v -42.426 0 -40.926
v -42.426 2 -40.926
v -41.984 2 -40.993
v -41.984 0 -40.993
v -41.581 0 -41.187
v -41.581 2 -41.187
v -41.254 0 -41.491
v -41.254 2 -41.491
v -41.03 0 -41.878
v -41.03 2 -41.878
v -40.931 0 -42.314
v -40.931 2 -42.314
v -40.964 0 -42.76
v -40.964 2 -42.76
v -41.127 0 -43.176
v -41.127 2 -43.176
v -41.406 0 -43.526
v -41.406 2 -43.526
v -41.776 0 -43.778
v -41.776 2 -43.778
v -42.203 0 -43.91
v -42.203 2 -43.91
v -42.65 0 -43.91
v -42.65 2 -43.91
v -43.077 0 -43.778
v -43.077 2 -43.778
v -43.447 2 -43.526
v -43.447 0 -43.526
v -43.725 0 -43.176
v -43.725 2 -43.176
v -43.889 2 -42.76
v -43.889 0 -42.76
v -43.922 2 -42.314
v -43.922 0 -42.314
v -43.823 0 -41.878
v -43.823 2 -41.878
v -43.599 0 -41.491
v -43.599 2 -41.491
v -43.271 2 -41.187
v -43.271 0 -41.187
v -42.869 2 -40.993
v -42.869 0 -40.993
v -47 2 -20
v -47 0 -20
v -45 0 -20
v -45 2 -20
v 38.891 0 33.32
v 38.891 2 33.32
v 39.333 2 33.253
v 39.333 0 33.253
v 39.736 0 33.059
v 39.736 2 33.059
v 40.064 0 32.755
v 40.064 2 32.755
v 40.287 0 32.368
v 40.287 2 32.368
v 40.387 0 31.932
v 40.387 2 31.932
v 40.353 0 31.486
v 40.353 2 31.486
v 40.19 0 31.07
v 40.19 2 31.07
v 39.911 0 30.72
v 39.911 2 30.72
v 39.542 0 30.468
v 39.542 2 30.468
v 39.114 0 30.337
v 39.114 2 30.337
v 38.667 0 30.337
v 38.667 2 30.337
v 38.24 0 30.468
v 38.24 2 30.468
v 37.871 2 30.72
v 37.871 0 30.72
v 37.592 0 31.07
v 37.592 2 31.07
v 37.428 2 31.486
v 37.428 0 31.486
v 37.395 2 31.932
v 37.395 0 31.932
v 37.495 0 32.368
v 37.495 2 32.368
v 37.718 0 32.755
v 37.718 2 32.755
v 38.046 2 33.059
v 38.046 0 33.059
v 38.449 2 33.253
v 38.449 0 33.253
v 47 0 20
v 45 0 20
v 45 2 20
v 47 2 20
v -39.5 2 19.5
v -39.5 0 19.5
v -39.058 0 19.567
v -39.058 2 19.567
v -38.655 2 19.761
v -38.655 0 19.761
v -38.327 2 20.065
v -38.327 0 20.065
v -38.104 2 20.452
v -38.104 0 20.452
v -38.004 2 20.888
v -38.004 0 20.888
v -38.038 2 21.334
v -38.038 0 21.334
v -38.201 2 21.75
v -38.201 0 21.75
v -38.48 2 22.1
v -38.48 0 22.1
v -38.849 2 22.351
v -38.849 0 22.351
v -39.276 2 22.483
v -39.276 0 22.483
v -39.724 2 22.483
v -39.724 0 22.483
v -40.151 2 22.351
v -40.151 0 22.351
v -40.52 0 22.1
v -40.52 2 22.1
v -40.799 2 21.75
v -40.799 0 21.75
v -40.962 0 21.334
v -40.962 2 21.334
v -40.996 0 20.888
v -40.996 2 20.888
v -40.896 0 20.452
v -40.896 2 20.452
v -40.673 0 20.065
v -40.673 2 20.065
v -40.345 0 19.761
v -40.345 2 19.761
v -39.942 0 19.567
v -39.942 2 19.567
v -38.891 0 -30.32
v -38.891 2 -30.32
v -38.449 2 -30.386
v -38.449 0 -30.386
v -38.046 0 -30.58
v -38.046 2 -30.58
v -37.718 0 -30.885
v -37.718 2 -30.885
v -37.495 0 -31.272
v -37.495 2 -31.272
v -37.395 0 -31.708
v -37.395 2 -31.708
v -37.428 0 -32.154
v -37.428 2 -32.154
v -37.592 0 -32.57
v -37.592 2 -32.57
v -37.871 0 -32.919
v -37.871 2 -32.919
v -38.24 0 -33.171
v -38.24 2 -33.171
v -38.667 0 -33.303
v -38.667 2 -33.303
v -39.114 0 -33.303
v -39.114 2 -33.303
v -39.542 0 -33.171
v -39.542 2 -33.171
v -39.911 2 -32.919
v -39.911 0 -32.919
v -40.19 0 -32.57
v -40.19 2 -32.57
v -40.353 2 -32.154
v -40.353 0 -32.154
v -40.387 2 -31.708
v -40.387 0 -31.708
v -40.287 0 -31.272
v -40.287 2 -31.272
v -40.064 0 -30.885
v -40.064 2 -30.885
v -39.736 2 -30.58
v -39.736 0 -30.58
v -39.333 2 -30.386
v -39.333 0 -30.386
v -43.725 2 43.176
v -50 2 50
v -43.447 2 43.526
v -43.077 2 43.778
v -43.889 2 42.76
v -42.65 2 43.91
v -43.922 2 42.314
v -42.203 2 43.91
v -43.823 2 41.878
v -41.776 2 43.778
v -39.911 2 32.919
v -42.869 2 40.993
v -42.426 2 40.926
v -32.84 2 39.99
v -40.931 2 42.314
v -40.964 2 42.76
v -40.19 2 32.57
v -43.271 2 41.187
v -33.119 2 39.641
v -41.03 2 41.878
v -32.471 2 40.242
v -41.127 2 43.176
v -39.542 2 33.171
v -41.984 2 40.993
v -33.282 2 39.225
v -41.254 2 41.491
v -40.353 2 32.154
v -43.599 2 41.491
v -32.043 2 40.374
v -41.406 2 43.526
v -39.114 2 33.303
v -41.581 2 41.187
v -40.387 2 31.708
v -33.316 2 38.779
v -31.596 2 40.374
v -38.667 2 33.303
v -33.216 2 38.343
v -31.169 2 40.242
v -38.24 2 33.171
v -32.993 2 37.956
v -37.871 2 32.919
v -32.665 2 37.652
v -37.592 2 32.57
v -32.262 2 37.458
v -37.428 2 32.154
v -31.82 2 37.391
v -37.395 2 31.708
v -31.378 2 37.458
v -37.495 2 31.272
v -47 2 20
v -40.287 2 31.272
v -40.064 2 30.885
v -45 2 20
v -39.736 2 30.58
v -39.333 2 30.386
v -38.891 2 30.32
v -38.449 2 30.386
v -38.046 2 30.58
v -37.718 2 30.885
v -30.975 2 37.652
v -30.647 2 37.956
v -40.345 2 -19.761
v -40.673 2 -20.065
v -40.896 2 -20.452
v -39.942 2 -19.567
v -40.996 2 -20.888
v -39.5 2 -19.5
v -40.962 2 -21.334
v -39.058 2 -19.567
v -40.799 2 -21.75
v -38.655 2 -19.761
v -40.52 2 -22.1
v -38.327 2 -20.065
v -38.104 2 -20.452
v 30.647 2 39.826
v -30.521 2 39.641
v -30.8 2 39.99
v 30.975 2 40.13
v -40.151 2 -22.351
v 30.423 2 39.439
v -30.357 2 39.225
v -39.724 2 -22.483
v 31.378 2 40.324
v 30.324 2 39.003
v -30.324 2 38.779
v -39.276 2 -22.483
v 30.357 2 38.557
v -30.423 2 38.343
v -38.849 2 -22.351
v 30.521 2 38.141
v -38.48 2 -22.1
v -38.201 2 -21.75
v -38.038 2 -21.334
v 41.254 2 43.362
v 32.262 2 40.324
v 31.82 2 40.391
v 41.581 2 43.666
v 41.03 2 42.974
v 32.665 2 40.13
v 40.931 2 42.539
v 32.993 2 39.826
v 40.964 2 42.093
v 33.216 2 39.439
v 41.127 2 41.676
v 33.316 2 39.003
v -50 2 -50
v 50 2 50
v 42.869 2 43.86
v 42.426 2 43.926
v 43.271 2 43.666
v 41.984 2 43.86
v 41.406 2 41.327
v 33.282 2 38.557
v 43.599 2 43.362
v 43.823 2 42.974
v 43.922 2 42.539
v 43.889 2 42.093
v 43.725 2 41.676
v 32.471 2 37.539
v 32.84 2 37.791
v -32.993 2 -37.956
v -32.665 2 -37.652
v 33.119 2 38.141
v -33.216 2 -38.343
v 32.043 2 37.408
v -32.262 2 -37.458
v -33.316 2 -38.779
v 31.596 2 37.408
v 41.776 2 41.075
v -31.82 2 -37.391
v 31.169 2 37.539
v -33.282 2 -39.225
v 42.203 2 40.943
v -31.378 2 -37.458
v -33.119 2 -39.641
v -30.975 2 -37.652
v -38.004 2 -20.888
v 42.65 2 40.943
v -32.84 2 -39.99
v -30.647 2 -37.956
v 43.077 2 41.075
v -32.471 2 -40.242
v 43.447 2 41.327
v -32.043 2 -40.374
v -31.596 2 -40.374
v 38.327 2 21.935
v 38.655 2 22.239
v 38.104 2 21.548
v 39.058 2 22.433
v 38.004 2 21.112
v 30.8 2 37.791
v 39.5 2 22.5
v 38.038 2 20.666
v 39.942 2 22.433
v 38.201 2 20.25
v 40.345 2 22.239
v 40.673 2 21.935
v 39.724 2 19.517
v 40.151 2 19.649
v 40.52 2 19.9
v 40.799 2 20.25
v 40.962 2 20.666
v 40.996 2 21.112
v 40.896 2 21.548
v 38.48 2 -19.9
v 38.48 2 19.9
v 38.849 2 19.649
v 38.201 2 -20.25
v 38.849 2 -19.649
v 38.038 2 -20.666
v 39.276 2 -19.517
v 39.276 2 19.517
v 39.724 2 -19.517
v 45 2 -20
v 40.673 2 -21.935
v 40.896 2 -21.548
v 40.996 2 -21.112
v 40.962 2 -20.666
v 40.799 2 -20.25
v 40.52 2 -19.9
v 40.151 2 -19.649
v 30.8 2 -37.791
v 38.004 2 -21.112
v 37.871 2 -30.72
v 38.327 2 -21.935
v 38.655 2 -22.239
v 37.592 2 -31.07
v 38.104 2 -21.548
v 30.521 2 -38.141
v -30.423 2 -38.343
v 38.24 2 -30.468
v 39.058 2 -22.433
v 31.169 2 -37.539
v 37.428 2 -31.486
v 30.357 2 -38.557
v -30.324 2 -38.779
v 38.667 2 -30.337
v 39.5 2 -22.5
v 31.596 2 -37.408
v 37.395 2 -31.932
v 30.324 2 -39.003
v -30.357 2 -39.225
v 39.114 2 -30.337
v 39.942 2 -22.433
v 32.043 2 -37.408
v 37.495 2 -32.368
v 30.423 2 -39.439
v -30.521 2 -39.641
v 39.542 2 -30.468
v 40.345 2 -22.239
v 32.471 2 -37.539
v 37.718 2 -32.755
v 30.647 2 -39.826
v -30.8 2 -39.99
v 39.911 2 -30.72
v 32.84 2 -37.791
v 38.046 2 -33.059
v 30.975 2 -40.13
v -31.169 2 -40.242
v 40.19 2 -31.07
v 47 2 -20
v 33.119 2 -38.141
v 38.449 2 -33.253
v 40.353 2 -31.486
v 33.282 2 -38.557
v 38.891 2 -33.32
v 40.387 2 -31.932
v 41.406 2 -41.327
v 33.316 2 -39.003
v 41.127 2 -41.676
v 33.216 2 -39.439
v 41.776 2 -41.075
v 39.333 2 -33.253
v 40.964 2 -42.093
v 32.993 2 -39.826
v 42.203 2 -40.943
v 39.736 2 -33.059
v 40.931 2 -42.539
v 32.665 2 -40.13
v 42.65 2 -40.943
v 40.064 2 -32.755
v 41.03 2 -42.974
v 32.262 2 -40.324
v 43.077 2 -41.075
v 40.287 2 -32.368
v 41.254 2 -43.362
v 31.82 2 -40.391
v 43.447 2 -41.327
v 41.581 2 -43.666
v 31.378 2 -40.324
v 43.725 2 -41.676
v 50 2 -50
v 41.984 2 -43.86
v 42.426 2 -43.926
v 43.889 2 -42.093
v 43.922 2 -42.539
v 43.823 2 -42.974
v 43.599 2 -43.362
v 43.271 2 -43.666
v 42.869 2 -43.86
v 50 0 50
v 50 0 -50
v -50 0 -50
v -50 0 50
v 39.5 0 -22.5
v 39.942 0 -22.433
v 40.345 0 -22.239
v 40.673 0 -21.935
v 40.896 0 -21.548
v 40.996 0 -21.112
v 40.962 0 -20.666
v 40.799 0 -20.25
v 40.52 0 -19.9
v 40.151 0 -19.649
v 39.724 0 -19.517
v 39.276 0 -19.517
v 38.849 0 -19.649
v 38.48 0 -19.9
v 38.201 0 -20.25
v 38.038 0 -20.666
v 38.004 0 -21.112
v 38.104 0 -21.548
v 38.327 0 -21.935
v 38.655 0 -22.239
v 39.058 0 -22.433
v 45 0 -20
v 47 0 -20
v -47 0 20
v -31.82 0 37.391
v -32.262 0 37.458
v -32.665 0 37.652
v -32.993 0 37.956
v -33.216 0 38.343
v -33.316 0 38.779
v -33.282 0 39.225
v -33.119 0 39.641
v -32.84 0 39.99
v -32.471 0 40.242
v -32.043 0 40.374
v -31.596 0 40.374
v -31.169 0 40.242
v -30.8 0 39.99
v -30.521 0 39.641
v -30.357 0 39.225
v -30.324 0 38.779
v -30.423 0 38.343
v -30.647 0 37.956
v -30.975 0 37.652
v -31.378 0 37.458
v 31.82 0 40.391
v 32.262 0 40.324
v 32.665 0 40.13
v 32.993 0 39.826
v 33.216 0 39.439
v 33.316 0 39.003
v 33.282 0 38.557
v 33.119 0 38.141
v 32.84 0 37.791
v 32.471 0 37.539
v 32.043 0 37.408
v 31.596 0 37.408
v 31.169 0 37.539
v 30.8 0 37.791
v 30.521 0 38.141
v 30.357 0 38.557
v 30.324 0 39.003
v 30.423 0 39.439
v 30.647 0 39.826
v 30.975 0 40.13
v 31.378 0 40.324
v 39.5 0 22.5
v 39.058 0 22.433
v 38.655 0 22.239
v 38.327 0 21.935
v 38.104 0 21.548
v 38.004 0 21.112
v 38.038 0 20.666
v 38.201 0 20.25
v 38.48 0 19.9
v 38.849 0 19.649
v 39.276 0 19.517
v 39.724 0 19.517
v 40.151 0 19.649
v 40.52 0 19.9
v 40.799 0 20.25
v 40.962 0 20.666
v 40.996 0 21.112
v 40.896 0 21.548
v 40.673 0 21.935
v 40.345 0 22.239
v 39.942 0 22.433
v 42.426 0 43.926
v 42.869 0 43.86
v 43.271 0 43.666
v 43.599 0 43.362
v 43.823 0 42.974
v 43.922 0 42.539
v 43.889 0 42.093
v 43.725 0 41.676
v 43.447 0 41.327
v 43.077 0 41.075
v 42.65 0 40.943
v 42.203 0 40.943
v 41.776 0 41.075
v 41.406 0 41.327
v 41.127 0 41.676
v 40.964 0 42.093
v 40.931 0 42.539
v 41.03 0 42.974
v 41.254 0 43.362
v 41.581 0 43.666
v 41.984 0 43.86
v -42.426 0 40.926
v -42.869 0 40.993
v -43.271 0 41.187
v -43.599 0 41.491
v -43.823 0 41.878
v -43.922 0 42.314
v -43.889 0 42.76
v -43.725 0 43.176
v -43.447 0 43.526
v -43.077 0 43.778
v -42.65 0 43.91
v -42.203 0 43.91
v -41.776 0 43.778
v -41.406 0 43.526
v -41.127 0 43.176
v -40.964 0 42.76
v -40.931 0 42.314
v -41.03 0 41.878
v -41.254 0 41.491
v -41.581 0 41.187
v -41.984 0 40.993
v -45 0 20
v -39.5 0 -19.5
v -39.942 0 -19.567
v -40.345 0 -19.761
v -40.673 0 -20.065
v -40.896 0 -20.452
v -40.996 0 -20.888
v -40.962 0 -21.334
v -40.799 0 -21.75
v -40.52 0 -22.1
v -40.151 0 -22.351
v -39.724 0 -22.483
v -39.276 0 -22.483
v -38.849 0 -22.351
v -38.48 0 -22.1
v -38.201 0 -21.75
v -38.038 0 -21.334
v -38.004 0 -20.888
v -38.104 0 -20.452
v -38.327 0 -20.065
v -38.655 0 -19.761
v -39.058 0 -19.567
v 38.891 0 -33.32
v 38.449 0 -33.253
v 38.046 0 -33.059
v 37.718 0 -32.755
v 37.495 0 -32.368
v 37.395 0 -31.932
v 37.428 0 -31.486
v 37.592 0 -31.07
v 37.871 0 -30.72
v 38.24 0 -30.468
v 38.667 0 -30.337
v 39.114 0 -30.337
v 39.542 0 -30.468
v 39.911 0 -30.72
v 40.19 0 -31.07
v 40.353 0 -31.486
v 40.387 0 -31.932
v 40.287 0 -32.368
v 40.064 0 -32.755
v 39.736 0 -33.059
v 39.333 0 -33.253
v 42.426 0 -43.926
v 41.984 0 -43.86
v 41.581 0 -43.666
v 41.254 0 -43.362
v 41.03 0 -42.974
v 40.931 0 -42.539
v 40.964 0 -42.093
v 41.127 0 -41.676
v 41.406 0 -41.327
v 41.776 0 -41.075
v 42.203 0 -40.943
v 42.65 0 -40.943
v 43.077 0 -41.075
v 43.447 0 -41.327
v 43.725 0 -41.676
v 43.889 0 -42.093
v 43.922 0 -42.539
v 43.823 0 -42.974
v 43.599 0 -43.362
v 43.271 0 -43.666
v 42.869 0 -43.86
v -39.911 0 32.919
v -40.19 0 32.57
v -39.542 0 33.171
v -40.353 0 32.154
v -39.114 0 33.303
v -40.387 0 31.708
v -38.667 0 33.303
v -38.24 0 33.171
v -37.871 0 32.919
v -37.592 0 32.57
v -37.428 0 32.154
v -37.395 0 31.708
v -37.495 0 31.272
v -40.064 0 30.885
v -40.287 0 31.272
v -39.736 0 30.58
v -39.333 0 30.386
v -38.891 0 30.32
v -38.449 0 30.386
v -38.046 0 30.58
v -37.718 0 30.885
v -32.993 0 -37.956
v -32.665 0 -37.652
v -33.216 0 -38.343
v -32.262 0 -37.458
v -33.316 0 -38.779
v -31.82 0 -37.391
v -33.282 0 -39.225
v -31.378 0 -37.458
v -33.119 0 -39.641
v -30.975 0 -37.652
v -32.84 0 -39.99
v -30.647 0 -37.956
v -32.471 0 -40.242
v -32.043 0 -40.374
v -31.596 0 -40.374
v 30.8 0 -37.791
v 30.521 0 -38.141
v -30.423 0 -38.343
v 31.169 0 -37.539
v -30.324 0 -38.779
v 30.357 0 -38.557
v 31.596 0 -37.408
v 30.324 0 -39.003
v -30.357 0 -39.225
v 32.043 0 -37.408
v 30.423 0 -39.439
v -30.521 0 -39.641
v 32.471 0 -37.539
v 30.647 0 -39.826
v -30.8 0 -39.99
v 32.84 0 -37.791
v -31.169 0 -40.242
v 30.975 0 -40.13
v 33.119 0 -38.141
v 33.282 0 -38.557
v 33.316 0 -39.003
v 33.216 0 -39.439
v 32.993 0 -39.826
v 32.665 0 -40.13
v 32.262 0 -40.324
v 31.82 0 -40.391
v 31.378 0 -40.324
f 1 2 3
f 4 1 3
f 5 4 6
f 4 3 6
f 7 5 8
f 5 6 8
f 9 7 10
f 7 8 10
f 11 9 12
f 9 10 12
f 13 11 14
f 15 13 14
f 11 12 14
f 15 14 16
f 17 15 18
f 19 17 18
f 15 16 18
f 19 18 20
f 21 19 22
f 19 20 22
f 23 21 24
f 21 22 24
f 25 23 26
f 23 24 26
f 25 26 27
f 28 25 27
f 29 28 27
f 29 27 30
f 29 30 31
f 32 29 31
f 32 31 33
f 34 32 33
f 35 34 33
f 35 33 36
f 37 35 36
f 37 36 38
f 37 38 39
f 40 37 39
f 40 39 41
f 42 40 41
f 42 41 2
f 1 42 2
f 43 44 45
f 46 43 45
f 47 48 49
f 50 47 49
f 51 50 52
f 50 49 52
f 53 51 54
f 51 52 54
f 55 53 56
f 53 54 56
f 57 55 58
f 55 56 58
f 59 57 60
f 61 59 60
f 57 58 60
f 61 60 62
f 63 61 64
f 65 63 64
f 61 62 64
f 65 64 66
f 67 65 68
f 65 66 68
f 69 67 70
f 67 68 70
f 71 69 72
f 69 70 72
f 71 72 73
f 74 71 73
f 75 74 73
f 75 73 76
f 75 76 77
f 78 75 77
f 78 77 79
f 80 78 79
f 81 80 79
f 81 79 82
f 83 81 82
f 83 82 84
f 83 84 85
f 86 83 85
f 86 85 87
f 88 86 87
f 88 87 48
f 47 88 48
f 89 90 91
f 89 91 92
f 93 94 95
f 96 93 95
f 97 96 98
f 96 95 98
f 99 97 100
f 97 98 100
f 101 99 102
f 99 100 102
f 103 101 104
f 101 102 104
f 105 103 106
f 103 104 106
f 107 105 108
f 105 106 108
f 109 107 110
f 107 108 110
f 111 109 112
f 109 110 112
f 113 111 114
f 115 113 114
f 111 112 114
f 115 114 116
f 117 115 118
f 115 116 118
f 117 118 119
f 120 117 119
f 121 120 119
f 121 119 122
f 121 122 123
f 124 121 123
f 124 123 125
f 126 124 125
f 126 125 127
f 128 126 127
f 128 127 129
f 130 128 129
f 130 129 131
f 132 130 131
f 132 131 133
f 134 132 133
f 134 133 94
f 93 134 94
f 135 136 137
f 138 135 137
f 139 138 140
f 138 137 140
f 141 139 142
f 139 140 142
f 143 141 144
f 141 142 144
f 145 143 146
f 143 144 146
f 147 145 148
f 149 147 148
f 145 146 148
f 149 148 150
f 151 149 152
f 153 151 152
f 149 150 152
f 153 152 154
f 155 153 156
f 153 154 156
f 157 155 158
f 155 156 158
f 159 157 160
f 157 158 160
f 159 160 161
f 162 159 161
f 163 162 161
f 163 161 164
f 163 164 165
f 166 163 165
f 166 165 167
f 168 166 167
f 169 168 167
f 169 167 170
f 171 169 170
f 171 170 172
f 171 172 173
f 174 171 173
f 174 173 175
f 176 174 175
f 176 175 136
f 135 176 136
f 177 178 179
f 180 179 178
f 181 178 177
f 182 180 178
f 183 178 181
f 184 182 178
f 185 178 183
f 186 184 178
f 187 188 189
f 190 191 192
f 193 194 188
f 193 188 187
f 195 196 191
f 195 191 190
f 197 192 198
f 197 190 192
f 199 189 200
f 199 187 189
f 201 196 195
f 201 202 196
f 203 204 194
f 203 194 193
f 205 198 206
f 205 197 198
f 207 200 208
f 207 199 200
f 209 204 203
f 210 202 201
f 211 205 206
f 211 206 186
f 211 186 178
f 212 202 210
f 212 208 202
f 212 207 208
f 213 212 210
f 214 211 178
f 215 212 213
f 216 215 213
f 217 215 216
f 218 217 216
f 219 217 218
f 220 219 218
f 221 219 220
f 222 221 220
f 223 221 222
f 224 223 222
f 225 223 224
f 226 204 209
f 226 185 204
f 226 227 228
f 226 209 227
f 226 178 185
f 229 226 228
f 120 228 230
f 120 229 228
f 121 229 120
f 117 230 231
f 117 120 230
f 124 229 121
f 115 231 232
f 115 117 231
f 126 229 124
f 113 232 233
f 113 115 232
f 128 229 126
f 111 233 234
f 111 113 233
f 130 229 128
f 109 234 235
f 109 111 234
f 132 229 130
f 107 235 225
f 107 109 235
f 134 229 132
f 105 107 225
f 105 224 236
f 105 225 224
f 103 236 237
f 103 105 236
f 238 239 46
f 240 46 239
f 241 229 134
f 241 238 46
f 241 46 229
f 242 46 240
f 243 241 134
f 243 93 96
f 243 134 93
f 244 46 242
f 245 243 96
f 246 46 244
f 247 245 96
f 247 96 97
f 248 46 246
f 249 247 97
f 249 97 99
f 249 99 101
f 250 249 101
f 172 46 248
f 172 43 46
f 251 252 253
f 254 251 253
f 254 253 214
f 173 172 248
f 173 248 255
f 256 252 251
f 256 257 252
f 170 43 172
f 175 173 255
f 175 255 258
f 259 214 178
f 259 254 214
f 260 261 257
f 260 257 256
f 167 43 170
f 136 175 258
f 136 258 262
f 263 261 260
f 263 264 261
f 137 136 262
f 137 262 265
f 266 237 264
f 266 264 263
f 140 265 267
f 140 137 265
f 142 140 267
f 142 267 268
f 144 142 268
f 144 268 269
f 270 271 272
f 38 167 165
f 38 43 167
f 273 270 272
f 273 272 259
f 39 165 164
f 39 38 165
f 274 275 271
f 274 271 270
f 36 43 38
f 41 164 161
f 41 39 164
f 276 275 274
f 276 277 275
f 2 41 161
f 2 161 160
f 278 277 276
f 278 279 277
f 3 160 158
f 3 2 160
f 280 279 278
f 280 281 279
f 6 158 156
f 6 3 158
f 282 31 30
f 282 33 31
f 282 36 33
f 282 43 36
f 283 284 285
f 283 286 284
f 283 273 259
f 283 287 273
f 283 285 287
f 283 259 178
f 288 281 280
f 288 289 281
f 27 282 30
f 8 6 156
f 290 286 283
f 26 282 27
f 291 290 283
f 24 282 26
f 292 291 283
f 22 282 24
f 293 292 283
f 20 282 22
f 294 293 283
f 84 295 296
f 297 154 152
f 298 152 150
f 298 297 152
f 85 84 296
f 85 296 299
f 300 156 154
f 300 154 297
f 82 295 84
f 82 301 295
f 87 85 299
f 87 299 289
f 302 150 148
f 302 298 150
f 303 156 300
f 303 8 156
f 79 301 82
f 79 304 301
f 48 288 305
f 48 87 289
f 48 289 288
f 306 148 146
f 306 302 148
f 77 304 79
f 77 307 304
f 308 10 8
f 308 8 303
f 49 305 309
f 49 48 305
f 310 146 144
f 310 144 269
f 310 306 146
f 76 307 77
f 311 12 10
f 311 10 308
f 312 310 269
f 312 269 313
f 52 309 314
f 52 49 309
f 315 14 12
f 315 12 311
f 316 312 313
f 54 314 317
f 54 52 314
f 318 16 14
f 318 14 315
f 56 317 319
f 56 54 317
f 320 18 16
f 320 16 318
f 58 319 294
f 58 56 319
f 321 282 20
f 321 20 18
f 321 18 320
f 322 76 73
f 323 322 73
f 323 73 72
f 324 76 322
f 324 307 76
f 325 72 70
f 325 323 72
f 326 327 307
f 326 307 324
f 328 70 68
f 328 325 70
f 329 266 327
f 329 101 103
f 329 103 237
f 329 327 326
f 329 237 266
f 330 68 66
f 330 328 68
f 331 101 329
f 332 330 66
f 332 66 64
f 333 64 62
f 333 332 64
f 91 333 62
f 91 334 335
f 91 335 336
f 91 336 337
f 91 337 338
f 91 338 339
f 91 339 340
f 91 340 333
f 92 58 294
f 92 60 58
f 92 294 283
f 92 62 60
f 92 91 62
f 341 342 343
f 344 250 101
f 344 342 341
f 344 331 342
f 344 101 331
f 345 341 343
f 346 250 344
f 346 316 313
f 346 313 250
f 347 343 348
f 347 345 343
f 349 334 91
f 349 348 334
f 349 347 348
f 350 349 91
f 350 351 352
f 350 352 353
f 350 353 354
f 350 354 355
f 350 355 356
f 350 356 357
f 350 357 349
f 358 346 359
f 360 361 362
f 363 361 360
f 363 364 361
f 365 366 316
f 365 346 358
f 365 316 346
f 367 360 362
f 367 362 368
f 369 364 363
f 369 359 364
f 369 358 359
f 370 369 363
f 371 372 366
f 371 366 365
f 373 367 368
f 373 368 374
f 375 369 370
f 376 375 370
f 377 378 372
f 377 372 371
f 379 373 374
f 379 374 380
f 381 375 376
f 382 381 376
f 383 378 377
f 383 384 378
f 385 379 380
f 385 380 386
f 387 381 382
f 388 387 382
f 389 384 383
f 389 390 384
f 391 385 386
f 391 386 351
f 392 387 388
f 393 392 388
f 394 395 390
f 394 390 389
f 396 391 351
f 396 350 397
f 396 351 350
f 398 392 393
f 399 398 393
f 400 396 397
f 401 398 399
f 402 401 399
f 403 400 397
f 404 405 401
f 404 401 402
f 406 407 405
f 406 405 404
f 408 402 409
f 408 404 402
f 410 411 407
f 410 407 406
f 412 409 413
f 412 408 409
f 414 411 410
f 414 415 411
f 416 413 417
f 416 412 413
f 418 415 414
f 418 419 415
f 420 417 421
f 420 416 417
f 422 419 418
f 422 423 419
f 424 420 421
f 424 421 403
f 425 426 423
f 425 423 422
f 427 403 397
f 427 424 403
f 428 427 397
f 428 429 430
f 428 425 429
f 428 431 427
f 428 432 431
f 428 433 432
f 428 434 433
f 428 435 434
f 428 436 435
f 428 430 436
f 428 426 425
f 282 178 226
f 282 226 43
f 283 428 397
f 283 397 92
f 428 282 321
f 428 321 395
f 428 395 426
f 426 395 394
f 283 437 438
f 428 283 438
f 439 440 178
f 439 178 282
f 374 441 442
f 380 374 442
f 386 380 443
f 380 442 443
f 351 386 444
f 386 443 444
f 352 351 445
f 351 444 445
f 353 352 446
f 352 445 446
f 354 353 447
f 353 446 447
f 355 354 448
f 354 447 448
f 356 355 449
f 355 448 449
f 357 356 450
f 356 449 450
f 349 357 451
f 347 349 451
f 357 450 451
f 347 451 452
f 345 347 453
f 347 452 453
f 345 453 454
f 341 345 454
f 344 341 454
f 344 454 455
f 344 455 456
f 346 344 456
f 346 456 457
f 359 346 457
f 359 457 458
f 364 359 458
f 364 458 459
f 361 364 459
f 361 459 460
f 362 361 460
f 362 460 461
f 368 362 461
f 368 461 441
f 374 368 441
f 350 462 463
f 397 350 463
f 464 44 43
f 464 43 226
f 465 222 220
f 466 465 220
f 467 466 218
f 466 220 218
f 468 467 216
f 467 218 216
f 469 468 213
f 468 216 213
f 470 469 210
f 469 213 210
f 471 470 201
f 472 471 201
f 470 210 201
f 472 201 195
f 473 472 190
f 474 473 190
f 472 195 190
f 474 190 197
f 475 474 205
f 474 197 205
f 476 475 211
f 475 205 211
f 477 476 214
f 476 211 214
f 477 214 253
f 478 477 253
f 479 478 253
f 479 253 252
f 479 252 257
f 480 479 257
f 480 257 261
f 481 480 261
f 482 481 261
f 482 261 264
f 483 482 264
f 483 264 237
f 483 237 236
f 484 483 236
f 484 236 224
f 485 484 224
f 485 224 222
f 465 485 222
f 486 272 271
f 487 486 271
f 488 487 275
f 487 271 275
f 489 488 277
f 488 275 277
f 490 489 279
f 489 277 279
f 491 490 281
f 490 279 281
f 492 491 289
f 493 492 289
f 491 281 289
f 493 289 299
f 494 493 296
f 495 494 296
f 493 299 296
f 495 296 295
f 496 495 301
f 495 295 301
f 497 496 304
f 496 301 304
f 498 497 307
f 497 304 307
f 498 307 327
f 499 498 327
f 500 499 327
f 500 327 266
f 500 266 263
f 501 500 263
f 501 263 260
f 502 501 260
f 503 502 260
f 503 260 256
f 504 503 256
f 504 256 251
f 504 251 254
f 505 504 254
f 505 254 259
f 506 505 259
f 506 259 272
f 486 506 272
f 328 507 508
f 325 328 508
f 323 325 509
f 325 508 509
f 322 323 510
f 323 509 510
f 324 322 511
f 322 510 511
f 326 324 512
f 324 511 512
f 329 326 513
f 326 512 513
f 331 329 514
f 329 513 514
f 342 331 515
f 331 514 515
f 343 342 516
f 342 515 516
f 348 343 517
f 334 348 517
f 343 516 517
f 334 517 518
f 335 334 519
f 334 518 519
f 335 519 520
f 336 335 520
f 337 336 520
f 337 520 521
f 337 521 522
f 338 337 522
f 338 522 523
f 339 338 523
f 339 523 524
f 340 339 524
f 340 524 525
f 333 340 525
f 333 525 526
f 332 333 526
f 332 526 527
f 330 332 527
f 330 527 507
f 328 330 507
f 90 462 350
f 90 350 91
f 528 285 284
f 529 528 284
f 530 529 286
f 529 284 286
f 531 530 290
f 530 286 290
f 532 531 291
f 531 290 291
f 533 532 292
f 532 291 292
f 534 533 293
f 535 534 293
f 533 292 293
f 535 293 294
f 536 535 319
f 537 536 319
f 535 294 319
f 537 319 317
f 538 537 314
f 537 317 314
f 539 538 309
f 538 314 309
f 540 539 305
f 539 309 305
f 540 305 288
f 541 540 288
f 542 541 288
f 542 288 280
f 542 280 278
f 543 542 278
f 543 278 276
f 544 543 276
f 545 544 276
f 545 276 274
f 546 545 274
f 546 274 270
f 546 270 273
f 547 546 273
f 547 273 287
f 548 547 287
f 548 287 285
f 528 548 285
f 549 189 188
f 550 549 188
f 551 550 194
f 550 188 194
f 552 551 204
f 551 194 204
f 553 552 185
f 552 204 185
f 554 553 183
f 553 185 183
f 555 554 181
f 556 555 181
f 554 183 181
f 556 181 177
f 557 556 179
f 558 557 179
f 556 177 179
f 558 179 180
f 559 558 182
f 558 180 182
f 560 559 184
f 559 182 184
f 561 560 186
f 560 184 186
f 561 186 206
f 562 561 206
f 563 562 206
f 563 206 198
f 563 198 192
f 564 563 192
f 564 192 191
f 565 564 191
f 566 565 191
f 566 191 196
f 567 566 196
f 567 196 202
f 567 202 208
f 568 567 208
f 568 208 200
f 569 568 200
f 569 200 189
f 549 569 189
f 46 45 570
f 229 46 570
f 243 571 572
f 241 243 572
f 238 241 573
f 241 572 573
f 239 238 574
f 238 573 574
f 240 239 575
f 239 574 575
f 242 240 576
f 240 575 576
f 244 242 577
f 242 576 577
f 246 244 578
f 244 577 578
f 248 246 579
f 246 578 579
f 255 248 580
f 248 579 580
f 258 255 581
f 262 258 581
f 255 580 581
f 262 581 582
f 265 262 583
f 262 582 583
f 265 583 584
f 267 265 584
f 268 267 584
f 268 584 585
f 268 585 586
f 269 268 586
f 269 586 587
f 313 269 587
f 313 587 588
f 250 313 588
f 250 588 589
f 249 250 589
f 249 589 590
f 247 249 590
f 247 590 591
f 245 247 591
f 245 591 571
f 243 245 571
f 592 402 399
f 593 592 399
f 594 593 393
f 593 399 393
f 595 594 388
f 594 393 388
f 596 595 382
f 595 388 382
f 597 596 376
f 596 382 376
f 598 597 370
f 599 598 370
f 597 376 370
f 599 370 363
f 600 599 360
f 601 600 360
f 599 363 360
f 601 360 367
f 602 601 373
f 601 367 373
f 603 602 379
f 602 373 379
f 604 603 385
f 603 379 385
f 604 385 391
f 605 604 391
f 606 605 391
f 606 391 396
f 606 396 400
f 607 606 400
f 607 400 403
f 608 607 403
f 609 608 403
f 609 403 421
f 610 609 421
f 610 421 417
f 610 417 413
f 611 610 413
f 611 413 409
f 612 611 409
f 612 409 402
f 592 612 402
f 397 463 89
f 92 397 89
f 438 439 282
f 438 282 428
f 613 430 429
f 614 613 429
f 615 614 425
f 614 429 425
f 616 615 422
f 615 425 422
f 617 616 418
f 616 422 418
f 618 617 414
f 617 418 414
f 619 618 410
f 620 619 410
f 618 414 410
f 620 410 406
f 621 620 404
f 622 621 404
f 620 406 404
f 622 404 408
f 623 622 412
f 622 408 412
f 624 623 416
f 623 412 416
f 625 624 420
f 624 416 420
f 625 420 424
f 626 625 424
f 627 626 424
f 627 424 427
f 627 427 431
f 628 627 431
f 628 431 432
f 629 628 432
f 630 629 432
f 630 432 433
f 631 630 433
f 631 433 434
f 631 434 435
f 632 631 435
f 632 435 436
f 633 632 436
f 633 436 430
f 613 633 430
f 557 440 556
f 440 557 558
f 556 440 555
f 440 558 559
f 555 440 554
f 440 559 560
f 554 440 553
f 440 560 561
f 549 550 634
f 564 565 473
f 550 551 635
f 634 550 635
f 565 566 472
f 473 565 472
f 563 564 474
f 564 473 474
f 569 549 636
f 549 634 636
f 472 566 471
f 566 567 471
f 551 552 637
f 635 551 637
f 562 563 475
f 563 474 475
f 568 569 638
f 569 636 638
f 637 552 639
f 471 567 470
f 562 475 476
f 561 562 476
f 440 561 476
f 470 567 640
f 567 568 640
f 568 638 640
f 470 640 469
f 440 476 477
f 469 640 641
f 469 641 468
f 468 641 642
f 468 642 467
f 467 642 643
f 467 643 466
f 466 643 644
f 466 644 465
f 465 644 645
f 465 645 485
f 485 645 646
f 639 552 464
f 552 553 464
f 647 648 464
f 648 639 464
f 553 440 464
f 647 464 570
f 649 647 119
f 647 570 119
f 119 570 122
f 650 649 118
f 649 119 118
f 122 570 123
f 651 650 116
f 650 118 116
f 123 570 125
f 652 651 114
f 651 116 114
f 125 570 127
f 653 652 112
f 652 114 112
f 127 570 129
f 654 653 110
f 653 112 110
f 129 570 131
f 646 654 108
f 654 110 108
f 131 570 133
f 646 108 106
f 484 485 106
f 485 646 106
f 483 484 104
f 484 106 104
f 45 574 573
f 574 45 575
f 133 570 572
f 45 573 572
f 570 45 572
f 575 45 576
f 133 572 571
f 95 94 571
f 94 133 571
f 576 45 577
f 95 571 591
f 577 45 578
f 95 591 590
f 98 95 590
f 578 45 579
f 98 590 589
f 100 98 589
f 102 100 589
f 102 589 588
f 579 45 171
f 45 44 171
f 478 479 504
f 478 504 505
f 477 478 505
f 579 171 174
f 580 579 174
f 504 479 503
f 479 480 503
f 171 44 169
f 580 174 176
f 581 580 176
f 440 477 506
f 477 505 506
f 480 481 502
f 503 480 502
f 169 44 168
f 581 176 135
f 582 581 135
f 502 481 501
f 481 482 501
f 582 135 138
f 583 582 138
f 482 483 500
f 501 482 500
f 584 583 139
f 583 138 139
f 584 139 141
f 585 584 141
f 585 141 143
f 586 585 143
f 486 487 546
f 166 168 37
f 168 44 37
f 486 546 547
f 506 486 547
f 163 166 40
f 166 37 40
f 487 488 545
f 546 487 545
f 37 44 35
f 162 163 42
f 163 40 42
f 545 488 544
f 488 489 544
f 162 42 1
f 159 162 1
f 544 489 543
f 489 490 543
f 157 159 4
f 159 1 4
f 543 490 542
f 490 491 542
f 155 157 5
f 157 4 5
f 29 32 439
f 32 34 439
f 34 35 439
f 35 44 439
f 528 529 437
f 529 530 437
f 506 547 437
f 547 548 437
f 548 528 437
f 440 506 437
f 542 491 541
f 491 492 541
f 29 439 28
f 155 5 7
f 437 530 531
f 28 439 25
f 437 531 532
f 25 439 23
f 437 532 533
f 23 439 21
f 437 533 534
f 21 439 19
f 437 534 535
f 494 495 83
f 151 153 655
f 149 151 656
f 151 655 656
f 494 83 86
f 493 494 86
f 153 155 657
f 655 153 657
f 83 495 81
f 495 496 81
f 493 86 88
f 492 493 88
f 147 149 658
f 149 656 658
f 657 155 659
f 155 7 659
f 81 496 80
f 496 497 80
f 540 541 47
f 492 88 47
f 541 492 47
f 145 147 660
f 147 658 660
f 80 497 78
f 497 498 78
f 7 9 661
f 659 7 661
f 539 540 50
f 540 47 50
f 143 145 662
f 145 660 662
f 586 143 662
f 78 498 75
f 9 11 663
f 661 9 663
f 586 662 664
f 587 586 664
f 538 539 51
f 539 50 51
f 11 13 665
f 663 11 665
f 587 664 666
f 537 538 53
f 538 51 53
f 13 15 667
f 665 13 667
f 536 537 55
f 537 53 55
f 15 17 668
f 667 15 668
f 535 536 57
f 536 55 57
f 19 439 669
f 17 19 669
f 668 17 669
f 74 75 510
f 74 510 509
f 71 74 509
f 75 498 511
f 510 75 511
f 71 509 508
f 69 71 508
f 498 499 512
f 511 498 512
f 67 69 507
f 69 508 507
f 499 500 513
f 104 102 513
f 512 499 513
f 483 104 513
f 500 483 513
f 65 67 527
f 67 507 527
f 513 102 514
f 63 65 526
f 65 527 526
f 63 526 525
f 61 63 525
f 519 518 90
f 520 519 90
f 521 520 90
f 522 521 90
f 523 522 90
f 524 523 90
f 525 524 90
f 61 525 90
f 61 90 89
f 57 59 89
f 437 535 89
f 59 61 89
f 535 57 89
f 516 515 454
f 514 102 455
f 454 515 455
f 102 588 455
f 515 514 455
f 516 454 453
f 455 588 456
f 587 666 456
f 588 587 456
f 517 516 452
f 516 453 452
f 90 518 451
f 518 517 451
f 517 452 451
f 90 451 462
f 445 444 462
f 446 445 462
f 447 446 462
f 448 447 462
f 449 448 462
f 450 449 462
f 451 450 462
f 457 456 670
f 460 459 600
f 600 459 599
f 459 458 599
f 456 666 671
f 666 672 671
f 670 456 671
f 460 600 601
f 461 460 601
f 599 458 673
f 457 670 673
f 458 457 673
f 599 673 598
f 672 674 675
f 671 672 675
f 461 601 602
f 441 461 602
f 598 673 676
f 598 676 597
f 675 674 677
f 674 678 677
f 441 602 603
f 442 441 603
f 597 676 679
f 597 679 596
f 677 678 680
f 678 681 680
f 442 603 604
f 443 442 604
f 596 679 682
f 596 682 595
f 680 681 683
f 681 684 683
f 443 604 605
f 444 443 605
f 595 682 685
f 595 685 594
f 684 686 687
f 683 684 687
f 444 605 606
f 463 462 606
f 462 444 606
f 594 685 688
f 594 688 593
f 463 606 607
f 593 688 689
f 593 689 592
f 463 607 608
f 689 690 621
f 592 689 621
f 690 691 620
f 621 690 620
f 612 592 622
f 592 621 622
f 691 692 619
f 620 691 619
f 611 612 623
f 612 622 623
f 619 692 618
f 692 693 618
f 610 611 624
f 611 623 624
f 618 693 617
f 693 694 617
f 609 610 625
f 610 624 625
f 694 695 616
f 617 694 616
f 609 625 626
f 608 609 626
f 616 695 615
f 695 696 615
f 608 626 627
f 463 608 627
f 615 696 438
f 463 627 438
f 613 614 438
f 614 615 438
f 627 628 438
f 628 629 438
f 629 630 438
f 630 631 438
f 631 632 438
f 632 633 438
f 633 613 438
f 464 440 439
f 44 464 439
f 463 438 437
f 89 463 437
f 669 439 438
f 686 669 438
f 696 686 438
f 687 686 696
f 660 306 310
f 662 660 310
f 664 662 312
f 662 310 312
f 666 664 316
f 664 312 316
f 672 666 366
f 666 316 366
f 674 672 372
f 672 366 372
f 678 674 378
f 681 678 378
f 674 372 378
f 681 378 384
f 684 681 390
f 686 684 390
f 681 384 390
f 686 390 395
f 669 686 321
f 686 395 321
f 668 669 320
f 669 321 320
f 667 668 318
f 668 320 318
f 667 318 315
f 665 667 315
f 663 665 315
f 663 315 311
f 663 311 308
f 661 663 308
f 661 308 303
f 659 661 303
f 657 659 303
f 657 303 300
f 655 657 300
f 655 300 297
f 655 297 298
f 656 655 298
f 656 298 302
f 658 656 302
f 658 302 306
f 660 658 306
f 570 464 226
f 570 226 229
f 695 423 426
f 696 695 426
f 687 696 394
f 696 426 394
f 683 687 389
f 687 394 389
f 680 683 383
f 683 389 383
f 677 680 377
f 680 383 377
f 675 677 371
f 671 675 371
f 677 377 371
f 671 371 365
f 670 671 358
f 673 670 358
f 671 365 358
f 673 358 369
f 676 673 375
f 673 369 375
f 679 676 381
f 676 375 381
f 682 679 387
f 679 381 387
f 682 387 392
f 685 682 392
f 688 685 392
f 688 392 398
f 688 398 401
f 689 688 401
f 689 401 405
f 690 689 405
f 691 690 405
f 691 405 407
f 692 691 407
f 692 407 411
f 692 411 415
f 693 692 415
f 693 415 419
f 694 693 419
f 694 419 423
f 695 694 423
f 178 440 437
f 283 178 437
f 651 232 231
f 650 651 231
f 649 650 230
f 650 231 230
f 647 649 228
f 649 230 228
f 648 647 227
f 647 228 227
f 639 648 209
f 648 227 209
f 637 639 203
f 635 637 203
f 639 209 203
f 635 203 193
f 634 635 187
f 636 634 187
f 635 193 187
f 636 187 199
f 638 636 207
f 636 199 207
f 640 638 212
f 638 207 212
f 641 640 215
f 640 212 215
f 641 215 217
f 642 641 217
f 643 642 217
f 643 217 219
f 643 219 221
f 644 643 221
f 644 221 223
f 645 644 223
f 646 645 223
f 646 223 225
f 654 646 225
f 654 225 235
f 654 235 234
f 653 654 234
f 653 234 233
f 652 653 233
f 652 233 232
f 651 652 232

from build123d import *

# Parameters (mm, degrees)
SKETCH_1_W          = 100
SKETCH_1_H          = 100
EXTRUDE_1_DEPTH     = 2
SKETCH_3_R          = 1.5
CUT_EXTRUDE_2_DEPTH = 71.738956735
SKETCH_4_R          = 1.5
CUT_EXTRUDE_3_DEPTH = 71.738956735
SKETCH_5_W          = 2
SKETCH_5_H          = 40
CUT_EXTRUDE_4_DEPTH = 71.738956735


with BuildPart() as part:
    # 草图1 → 凸台-拉伸1 (new body)
    with BuildSketch(Plane(origin=(0, 0, 0), x_dir=(1, 0, 0), z_dir=(0, 1, 0))):
        Rectangle(SKETCH_1_W, SKETCH_1_H)
    extrude(amount=EXTRUDE_1_DEPTH)

    # 草图3 → 切除-拉伸2 (cut, through all)
    with BuildSketch(Plane(origin=(0, 2, 0), x_dir=(1, 0, 0), z_dir=(0, 1, 0))):
        with Locations(Location((-42.426406871, 42.426406871, 0), (0, 0, 270))):
            Circle(SKETCH_3_R)
        with Locations(Location((-31.819805153, 38.890872965, 0), (0, 0, 270))):
            Circle(SKETCH_3_R)
        with Locations(Location((-38.890872965, 31.819805153, 0), (0, 0, 270))):
            Circle(SKETCH_3_R)
        with Locations(Location((-31.819805153, -38.890872965, 0), (0, 0, 90))):
            Circle(SKETCH_3_R)
        with Locations(Location((-38.890872965, -31.819805153, 0), (0, 0, 90))):
            Circle(SKETCH_3_R)
        with Locations(Location((-42.426406871, -42.426406871, 0), (0, 0, 90))):
            Circle(SKETCH_3_R)
        with Locations(Location((31.819805153, 38.890872965, 0), (0, 0, 90))):
            Circle(SKETCH_3_R)
        with Locations(Location((38.890872965, 31.819805153, 0), (0, 0, 90))):
            Circle(SKETCH_3_R)
        with Locations(Location((42.426406871, 42.426406871, 0), (0, 0, 90))):
            Circle(SKETCH_3_R)
        with Locations(Location((31.819805153, -38.890872965, 0), (0, 0, 270))):
            Circle(SKETCH_3_R)
        with Locations(Location((42.426406871, -42.426406871, 0), (0, 0, 270))):
            Circle(SKETCH_3_R)
        with Locations(Location((38.890872965, -31.819805153, 0), (0, 0, 270))):
            Circle(SKETCH_3_R)
    extrude(amount=-CUT_EXTRUDE_2_DEPTH, mode=Mode.SUBTRACT)

    # 草图4 → 切除-拉伸3 (cut, through all)
    with BuildSketch(Plane.XZ):
        with Locations(Location((-39.5, 21, 0), (0, 0, 270))):
            Circle(SKETCH_4_R)
        with Locations(Location((39.5, 21, 0), (0, 0, 90))):
            Circle(SKETCH_4_R)
        with Locations(Location((39.5, -21, 0), (0, 0, 270))):
            Circle(SKETCH_4_R)
        with Locations(Location((-39.5, -21, 0), (0, 0, 90))):
            Circle(SKETCH_4_R)
    extrude(amount=-CUT_EXTRUDE_3_DEPTH, mode=Mode.SUBTRACT)

    # 草图5 → 切除-拉伸4 (cut, through all)
    with BuildSketch(Plane.XZ):
        with Locations((-46, 0)):
            Rectangle(SKETCH_5_W, SKETCH_5_H)
        with Locations((46, 0)):
            Rectangle(SKETCH_5_W, SKETCH_5_H)
    extrude(amount=-CUT_EXTRUDE_4_DEPTH, mode=Mode.SUBTRACT)


solid = part.part
